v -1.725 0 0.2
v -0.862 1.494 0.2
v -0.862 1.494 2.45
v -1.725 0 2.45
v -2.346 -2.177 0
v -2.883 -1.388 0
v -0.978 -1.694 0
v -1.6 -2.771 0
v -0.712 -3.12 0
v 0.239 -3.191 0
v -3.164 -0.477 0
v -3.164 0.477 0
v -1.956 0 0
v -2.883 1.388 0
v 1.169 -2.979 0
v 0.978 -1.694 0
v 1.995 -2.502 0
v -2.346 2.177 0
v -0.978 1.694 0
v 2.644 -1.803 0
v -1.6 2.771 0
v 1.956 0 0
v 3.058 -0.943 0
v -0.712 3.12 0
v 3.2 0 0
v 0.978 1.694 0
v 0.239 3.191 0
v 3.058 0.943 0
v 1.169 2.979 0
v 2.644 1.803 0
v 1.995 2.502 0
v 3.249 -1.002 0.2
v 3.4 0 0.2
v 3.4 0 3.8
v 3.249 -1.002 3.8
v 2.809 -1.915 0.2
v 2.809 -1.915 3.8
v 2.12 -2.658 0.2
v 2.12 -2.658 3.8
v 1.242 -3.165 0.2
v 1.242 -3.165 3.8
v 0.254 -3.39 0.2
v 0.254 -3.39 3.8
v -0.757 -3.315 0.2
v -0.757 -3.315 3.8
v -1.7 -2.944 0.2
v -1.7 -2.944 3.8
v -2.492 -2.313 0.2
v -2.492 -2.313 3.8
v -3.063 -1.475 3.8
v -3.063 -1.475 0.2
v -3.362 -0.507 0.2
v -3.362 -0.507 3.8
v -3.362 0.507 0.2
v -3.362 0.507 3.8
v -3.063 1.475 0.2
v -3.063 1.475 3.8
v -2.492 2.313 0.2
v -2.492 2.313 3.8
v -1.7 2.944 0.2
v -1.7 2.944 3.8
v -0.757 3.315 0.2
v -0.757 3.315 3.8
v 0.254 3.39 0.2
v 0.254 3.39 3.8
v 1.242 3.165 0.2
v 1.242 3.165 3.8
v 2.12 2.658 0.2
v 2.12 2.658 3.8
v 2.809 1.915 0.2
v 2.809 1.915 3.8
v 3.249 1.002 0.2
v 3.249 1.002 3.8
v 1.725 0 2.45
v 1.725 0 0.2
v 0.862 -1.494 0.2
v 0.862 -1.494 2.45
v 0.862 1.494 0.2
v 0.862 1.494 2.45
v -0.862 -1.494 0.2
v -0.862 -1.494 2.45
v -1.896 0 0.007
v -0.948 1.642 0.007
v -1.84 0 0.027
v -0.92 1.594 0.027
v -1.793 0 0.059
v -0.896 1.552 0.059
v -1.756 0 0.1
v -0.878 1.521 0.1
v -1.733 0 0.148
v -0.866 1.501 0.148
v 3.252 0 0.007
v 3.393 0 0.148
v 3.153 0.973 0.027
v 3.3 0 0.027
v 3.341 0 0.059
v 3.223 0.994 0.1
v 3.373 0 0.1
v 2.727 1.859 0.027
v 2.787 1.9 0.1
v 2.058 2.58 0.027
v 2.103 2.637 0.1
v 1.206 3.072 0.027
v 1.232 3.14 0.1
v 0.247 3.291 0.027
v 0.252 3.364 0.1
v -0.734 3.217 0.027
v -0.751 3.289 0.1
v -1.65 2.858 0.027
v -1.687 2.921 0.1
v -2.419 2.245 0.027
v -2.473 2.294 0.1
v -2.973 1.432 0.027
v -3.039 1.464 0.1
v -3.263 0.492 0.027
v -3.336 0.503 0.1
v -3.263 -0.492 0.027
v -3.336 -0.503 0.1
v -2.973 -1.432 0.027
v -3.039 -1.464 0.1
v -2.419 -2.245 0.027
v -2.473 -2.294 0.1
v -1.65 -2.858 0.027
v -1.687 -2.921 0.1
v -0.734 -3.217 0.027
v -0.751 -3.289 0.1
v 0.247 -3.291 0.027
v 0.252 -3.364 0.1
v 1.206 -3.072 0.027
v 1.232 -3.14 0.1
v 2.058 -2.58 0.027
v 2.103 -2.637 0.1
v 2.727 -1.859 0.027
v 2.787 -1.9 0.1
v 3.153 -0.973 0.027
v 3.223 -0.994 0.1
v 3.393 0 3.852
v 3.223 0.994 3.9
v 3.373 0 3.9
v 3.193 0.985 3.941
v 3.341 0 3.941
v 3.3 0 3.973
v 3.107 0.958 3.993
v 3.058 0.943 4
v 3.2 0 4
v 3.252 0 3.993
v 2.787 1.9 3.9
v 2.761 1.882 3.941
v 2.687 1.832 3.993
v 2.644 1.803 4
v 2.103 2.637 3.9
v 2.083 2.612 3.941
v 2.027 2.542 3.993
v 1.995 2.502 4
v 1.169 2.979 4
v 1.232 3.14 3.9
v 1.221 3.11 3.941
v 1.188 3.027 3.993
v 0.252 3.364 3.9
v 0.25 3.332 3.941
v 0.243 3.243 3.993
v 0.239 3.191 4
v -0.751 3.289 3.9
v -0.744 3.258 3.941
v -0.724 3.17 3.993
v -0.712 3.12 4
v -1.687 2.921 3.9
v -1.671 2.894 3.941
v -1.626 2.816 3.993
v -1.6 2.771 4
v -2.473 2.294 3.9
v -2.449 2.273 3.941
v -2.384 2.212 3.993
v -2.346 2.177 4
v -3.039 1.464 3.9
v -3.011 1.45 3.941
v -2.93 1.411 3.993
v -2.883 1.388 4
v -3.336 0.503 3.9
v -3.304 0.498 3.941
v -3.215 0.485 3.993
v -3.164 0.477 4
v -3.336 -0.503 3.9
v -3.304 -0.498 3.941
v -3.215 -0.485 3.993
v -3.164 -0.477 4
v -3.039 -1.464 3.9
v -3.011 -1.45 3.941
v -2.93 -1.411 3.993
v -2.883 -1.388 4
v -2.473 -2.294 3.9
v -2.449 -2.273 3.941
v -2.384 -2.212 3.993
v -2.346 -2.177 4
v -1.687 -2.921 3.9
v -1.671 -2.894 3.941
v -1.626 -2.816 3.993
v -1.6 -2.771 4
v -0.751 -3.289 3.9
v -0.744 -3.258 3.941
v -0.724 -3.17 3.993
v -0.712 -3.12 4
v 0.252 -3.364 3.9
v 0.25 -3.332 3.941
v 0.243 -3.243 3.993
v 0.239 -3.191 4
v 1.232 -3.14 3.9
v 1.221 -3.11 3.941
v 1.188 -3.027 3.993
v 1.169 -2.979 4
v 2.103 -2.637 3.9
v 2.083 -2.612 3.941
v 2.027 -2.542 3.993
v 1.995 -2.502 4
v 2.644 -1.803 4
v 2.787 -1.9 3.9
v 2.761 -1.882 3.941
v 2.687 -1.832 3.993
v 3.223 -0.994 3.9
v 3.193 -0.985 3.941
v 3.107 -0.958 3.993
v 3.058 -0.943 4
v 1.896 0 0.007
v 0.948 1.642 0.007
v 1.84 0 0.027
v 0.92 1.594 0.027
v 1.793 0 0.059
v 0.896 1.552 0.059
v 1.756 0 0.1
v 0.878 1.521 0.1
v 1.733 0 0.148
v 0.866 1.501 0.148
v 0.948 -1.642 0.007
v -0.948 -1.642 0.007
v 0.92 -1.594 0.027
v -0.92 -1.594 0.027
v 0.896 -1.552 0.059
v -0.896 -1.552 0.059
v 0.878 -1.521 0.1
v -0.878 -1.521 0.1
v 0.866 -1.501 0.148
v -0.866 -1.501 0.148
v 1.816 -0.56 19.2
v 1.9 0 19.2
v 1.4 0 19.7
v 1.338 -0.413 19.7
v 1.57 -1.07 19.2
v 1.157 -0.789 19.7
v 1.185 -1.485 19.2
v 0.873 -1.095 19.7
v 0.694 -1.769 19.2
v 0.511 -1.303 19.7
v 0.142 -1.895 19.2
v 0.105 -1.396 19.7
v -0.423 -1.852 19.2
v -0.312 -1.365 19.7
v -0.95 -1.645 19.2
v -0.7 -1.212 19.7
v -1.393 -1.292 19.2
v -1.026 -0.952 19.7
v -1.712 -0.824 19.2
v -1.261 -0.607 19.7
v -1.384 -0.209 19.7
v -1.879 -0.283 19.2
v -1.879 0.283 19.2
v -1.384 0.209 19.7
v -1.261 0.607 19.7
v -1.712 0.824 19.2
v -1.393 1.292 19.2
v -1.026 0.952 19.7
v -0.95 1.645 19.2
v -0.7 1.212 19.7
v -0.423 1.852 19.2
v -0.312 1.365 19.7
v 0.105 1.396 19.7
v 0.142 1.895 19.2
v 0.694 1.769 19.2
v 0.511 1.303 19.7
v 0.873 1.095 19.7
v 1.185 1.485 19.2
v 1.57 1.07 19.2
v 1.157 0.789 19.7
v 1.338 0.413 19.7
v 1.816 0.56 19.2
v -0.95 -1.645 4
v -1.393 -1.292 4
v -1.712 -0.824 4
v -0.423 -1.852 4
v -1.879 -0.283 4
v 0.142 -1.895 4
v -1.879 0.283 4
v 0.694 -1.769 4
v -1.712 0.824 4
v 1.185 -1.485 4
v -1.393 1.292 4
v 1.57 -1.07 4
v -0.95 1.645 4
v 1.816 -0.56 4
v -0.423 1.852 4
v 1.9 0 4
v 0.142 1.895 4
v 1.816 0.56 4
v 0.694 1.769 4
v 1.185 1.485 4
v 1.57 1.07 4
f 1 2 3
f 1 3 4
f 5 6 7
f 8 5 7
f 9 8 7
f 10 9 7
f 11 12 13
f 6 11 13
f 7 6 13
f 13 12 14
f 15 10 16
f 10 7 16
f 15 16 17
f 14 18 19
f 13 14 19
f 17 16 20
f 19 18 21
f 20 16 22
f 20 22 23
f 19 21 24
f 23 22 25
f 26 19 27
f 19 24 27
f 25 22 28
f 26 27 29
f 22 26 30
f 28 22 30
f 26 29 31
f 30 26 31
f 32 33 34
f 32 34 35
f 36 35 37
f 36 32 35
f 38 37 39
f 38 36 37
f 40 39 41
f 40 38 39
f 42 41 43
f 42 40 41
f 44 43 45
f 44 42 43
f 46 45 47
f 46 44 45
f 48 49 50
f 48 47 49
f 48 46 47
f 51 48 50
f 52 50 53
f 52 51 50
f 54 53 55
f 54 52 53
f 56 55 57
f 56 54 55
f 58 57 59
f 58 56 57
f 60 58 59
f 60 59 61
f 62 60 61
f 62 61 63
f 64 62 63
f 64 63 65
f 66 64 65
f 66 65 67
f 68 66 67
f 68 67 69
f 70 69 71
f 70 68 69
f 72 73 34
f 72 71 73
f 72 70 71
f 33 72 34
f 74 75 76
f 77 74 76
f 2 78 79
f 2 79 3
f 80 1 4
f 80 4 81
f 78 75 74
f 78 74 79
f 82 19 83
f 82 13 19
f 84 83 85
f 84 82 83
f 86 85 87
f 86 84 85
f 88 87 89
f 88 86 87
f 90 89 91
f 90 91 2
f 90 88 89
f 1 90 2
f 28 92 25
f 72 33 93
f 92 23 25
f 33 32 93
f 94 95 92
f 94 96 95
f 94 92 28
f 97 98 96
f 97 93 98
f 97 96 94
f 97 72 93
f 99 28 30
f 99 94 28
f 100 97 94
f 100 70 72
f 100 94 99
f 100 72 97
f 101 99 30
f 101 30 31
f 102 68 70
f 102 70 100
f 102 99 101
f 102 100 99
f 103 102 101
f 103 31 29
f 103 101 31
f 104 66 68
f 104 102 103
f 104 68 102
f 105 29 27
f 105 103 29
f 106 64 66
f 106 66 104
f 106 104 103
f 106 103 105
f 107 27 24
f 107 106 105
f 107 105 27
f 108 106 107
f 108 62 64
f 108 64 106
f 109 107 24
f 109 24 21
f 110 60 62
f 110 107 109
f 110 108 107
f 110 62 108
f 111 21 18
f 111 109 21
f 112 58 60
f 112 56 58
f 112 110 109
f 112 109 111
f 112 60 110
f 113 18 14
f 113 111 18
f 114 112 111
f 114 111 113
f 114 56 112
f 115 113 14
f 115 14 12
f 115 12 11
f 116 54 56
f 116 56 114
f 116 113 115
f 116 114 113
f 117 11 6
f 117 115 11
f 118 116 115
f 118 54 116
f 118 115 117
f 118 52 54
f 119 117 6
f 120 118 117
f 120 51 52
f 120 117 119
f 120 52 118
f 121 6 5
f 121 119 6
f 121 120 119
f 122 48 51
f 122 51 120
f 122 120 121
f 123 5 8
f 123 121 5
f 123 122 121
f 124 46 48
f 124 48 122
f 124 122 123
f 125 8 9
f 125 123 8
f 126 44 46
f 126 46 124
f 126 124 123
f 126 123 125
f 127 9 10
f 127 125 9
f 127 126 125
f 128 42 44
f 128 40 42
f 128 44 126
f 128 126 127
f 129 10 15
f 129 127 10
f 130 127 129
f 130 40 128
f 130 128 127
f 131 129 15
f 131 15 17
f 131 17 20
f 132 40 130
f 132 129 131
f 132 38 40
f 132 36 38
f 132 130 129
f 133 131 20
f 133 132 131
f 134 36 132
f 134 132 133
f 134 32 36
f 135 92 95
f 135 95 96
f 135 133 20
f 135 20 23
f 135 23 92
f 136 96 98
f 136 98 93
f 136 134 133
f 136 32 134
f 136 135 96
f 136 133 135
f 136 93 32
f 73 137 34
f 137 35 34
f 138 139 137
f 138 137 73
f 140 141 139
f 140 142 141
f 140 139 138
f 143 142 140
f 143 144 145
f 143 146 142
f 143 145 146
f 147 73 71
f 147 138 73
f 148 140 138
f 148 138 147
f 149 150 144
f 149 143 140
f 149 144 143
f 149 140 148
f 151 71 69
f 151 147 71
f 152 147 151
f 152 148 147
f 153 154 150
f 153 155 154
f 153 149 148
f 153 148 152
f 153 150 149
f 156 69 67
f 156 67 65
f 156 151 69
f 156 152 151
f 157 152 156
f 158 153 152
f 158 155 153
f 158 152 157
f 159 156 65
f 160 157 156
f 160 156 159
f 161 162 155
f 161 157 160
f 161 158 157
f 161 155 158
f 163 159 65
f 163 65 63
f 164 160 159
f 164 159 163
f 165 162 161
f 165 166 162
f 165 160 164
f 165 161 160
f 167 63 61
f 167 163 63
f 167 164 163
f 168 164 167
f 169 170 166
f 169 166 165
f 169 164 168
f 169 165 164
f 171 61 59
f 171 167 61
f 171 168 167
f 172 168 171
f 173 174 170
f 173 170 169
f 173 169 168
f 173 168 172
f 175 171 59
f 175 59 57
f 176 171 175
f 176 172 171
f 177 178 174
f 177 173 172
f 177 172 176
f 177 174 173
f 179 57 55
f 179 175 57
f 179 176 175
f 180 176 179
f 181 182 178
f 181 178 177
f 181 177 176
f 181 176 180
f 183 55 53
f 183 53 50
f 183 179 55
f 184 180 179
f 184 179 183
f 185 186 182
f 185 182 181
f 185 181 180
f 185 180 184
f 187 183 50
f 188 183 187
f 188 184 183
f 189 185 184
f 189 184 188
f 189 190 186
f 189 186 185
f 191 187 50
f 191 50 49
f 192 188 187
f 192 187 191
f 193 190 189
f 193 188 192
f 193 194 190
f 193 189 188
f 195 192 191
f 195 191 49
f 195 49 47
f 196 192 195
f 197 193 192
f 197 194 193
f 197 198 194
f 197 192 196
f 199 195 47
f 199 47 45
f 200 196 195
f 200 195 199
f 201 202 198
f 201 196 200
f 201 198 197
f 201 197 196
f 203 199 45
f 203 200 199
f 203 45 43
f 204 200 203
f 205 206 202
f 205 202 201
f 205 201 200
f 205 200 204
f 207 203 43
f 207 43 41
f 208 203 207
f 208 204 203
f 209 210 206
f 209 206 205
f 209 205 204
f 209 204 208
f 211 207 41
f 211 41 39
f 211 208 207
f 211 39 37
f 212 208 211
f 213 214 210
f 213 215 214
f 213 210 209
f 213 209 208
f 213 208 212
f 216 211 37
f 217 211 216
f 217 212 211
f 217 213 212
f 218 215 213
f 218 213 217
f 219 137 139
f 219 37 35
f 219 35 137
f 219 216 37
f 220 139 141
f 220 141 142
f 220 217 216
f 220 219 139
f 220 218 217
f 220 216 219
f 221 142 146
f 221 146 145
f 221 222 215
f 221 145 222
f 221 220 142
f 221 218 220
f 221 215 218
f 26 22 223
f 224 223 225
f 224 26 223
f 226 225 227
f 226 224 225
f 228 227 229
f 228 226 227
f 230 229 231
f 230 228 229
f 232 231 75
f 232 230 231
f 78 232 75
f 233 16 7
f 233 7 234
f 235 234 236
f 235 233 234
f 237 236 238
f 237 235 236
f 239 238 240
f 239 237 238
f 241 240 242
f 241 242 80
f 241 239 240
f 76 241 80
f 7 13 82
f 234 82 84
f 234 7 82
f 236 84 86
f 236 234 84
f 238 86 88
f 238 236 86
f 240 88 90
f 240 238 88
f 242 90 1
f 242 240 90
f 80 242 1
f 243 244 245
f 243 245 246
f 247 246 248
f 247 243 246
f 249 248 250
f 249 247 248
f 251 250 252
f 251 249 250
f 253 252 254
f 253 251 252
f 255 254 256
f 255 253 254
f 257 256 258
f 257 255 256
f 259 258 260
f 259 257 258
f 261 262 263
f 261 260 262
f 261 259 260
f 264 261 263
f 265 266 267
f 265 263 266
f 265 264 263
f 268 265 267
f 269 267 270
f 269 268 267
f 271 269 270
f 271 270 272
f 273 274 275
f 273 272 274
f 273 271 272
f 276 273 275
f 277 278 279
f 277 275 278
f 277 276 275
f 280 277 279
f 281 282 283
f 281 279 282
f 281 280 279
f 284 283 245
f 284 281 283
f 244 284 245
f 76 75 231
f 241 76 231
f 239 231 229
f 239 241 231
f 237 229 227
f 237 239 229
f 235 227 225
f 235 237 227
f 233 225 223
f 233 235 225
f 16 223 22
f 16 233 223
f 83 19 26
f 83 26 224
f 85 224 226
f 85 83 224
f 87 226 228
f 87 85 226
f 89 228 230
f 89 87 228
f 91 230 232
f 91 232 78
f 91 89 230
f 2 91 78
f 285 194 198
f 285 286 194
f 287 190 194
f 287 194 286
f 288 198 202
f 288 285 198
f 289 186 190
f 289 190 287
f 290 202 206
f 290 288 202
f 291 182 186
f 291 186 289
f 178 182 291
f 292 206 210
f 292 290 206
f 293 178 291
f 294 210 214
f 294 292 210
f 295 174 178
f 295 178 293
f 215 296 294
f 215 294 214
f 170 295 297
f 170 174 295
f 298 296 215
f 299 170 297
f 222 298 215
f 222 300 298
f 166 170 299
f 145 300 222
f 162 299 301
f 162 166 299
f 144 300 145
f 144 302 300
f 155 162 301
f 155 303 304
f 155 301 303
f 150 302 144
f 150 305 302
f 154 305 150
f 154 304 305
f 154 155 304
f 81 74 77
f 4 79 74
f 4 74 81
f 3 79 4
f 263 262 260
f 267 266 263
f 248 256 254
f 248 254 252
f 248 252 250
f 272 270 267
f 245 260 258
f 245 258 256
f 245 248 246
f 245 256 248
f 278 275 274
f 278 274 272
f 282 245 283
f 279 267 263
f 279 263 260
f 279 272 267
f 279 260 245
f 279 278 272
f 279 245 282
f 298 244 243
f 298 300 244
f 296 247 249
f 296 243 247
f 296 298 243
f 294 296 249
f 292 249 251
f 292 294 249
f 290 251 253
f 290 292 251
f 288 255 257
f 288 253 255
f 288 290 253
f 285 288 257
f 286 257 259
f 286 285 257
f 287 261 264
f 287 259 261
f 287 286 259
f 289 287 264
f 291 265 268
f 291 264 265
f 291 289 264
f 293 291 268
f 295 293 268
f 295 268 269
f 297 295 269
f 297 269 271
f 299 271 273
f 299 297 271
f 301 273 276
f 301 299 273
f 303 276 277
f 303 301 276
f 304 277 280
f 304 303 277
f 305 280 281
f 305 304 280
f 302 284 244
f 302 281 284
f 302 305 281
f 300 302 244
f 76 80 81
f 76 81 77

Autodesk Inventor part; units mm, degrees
ref_plane "YZ Plane" through (0, 0, 0) normal (1, 0, 0) x (0, 1, 0)
ref_plane "XZ Plane" through (0, 0, 0) normal (0, 1, 0) x (-1, 0, 0)
ref_plane "XY Plane" through (0, 0, 0) normal (0, 0, 1) x (1, 0, 0)
sketch "Sketch1" plane through (0, 0, 0) normal (0, 0, 1) x (1, 0, 0)
  point P0 (0, 0)
sketch "Sketch2" plane through (0, 0, 0) normal (0, 0, 1) x (1, 0, 0)
  circle A0 centre (0, 0) radius 3.4
  dimension "d0" = 6.8
extrude "Extrusion1" add sketch "Sketch2" along normal blind 4
sketch "Sketch3" plane through (0, 0, 4) normal (0, 0, 1) x (1, 0, 0)
  circle A0 centre (0, 0) radius 3.4 projected
  circle A1 centre (0, 0) radius 1.9
  dimension "d3" = 3.8
extrude "Extrusion2" add sketch "Sketch3" along normal blind 15.7 contours A1
sketch "Sketch4" plane through (0, 0, 0) normal (0, 0, -1) x (-1, 0, 0)
  circle A0 centre (0, 0) radius 3.4 projected
  circle A1 centre (0, 0) radius 3.4 projected
  line L0 (-0.8625, 1.4939) -> (0.8625, 1.4939)
  line L1 (0.8625, 1.4939) -> (1.725, 0)
  line L2 (1.725, 0) -> (0.8625, -1.4939)
  line L3 (0.8625, -1.4939) -> (-0.8625, -1.4939)
  line L4 (-1.725, 0) -> (-0.8625, -1.4939)
  line L5 (-1.725, 0) -> (-0.8625, 1.4939)
extrude "Extrusion3" cut sketch "Sketch4" against normal blind 2.45 contours L0 L1 L2 L3 L4 L5
fillet "Fillet1" radius 0.2 6 edges at (1.2937, 0.7469, 0) (0, 1.4939, 0) (-1.2937, 0.7469, 0) (-1.2937, -0.7469, 0) (0, -1.4939, 0) (1.2937, -0.7469, 0)
fillet "Fillet2" radius 0.2 2 edges at (-3.4, 0, 0) (-3.4, 0, 4)
chamfer "Chamfer1" distance 0.5 angle 45 1 edges at (-1.9, 0, 19.7)
properties part number "LUC GIAC"
